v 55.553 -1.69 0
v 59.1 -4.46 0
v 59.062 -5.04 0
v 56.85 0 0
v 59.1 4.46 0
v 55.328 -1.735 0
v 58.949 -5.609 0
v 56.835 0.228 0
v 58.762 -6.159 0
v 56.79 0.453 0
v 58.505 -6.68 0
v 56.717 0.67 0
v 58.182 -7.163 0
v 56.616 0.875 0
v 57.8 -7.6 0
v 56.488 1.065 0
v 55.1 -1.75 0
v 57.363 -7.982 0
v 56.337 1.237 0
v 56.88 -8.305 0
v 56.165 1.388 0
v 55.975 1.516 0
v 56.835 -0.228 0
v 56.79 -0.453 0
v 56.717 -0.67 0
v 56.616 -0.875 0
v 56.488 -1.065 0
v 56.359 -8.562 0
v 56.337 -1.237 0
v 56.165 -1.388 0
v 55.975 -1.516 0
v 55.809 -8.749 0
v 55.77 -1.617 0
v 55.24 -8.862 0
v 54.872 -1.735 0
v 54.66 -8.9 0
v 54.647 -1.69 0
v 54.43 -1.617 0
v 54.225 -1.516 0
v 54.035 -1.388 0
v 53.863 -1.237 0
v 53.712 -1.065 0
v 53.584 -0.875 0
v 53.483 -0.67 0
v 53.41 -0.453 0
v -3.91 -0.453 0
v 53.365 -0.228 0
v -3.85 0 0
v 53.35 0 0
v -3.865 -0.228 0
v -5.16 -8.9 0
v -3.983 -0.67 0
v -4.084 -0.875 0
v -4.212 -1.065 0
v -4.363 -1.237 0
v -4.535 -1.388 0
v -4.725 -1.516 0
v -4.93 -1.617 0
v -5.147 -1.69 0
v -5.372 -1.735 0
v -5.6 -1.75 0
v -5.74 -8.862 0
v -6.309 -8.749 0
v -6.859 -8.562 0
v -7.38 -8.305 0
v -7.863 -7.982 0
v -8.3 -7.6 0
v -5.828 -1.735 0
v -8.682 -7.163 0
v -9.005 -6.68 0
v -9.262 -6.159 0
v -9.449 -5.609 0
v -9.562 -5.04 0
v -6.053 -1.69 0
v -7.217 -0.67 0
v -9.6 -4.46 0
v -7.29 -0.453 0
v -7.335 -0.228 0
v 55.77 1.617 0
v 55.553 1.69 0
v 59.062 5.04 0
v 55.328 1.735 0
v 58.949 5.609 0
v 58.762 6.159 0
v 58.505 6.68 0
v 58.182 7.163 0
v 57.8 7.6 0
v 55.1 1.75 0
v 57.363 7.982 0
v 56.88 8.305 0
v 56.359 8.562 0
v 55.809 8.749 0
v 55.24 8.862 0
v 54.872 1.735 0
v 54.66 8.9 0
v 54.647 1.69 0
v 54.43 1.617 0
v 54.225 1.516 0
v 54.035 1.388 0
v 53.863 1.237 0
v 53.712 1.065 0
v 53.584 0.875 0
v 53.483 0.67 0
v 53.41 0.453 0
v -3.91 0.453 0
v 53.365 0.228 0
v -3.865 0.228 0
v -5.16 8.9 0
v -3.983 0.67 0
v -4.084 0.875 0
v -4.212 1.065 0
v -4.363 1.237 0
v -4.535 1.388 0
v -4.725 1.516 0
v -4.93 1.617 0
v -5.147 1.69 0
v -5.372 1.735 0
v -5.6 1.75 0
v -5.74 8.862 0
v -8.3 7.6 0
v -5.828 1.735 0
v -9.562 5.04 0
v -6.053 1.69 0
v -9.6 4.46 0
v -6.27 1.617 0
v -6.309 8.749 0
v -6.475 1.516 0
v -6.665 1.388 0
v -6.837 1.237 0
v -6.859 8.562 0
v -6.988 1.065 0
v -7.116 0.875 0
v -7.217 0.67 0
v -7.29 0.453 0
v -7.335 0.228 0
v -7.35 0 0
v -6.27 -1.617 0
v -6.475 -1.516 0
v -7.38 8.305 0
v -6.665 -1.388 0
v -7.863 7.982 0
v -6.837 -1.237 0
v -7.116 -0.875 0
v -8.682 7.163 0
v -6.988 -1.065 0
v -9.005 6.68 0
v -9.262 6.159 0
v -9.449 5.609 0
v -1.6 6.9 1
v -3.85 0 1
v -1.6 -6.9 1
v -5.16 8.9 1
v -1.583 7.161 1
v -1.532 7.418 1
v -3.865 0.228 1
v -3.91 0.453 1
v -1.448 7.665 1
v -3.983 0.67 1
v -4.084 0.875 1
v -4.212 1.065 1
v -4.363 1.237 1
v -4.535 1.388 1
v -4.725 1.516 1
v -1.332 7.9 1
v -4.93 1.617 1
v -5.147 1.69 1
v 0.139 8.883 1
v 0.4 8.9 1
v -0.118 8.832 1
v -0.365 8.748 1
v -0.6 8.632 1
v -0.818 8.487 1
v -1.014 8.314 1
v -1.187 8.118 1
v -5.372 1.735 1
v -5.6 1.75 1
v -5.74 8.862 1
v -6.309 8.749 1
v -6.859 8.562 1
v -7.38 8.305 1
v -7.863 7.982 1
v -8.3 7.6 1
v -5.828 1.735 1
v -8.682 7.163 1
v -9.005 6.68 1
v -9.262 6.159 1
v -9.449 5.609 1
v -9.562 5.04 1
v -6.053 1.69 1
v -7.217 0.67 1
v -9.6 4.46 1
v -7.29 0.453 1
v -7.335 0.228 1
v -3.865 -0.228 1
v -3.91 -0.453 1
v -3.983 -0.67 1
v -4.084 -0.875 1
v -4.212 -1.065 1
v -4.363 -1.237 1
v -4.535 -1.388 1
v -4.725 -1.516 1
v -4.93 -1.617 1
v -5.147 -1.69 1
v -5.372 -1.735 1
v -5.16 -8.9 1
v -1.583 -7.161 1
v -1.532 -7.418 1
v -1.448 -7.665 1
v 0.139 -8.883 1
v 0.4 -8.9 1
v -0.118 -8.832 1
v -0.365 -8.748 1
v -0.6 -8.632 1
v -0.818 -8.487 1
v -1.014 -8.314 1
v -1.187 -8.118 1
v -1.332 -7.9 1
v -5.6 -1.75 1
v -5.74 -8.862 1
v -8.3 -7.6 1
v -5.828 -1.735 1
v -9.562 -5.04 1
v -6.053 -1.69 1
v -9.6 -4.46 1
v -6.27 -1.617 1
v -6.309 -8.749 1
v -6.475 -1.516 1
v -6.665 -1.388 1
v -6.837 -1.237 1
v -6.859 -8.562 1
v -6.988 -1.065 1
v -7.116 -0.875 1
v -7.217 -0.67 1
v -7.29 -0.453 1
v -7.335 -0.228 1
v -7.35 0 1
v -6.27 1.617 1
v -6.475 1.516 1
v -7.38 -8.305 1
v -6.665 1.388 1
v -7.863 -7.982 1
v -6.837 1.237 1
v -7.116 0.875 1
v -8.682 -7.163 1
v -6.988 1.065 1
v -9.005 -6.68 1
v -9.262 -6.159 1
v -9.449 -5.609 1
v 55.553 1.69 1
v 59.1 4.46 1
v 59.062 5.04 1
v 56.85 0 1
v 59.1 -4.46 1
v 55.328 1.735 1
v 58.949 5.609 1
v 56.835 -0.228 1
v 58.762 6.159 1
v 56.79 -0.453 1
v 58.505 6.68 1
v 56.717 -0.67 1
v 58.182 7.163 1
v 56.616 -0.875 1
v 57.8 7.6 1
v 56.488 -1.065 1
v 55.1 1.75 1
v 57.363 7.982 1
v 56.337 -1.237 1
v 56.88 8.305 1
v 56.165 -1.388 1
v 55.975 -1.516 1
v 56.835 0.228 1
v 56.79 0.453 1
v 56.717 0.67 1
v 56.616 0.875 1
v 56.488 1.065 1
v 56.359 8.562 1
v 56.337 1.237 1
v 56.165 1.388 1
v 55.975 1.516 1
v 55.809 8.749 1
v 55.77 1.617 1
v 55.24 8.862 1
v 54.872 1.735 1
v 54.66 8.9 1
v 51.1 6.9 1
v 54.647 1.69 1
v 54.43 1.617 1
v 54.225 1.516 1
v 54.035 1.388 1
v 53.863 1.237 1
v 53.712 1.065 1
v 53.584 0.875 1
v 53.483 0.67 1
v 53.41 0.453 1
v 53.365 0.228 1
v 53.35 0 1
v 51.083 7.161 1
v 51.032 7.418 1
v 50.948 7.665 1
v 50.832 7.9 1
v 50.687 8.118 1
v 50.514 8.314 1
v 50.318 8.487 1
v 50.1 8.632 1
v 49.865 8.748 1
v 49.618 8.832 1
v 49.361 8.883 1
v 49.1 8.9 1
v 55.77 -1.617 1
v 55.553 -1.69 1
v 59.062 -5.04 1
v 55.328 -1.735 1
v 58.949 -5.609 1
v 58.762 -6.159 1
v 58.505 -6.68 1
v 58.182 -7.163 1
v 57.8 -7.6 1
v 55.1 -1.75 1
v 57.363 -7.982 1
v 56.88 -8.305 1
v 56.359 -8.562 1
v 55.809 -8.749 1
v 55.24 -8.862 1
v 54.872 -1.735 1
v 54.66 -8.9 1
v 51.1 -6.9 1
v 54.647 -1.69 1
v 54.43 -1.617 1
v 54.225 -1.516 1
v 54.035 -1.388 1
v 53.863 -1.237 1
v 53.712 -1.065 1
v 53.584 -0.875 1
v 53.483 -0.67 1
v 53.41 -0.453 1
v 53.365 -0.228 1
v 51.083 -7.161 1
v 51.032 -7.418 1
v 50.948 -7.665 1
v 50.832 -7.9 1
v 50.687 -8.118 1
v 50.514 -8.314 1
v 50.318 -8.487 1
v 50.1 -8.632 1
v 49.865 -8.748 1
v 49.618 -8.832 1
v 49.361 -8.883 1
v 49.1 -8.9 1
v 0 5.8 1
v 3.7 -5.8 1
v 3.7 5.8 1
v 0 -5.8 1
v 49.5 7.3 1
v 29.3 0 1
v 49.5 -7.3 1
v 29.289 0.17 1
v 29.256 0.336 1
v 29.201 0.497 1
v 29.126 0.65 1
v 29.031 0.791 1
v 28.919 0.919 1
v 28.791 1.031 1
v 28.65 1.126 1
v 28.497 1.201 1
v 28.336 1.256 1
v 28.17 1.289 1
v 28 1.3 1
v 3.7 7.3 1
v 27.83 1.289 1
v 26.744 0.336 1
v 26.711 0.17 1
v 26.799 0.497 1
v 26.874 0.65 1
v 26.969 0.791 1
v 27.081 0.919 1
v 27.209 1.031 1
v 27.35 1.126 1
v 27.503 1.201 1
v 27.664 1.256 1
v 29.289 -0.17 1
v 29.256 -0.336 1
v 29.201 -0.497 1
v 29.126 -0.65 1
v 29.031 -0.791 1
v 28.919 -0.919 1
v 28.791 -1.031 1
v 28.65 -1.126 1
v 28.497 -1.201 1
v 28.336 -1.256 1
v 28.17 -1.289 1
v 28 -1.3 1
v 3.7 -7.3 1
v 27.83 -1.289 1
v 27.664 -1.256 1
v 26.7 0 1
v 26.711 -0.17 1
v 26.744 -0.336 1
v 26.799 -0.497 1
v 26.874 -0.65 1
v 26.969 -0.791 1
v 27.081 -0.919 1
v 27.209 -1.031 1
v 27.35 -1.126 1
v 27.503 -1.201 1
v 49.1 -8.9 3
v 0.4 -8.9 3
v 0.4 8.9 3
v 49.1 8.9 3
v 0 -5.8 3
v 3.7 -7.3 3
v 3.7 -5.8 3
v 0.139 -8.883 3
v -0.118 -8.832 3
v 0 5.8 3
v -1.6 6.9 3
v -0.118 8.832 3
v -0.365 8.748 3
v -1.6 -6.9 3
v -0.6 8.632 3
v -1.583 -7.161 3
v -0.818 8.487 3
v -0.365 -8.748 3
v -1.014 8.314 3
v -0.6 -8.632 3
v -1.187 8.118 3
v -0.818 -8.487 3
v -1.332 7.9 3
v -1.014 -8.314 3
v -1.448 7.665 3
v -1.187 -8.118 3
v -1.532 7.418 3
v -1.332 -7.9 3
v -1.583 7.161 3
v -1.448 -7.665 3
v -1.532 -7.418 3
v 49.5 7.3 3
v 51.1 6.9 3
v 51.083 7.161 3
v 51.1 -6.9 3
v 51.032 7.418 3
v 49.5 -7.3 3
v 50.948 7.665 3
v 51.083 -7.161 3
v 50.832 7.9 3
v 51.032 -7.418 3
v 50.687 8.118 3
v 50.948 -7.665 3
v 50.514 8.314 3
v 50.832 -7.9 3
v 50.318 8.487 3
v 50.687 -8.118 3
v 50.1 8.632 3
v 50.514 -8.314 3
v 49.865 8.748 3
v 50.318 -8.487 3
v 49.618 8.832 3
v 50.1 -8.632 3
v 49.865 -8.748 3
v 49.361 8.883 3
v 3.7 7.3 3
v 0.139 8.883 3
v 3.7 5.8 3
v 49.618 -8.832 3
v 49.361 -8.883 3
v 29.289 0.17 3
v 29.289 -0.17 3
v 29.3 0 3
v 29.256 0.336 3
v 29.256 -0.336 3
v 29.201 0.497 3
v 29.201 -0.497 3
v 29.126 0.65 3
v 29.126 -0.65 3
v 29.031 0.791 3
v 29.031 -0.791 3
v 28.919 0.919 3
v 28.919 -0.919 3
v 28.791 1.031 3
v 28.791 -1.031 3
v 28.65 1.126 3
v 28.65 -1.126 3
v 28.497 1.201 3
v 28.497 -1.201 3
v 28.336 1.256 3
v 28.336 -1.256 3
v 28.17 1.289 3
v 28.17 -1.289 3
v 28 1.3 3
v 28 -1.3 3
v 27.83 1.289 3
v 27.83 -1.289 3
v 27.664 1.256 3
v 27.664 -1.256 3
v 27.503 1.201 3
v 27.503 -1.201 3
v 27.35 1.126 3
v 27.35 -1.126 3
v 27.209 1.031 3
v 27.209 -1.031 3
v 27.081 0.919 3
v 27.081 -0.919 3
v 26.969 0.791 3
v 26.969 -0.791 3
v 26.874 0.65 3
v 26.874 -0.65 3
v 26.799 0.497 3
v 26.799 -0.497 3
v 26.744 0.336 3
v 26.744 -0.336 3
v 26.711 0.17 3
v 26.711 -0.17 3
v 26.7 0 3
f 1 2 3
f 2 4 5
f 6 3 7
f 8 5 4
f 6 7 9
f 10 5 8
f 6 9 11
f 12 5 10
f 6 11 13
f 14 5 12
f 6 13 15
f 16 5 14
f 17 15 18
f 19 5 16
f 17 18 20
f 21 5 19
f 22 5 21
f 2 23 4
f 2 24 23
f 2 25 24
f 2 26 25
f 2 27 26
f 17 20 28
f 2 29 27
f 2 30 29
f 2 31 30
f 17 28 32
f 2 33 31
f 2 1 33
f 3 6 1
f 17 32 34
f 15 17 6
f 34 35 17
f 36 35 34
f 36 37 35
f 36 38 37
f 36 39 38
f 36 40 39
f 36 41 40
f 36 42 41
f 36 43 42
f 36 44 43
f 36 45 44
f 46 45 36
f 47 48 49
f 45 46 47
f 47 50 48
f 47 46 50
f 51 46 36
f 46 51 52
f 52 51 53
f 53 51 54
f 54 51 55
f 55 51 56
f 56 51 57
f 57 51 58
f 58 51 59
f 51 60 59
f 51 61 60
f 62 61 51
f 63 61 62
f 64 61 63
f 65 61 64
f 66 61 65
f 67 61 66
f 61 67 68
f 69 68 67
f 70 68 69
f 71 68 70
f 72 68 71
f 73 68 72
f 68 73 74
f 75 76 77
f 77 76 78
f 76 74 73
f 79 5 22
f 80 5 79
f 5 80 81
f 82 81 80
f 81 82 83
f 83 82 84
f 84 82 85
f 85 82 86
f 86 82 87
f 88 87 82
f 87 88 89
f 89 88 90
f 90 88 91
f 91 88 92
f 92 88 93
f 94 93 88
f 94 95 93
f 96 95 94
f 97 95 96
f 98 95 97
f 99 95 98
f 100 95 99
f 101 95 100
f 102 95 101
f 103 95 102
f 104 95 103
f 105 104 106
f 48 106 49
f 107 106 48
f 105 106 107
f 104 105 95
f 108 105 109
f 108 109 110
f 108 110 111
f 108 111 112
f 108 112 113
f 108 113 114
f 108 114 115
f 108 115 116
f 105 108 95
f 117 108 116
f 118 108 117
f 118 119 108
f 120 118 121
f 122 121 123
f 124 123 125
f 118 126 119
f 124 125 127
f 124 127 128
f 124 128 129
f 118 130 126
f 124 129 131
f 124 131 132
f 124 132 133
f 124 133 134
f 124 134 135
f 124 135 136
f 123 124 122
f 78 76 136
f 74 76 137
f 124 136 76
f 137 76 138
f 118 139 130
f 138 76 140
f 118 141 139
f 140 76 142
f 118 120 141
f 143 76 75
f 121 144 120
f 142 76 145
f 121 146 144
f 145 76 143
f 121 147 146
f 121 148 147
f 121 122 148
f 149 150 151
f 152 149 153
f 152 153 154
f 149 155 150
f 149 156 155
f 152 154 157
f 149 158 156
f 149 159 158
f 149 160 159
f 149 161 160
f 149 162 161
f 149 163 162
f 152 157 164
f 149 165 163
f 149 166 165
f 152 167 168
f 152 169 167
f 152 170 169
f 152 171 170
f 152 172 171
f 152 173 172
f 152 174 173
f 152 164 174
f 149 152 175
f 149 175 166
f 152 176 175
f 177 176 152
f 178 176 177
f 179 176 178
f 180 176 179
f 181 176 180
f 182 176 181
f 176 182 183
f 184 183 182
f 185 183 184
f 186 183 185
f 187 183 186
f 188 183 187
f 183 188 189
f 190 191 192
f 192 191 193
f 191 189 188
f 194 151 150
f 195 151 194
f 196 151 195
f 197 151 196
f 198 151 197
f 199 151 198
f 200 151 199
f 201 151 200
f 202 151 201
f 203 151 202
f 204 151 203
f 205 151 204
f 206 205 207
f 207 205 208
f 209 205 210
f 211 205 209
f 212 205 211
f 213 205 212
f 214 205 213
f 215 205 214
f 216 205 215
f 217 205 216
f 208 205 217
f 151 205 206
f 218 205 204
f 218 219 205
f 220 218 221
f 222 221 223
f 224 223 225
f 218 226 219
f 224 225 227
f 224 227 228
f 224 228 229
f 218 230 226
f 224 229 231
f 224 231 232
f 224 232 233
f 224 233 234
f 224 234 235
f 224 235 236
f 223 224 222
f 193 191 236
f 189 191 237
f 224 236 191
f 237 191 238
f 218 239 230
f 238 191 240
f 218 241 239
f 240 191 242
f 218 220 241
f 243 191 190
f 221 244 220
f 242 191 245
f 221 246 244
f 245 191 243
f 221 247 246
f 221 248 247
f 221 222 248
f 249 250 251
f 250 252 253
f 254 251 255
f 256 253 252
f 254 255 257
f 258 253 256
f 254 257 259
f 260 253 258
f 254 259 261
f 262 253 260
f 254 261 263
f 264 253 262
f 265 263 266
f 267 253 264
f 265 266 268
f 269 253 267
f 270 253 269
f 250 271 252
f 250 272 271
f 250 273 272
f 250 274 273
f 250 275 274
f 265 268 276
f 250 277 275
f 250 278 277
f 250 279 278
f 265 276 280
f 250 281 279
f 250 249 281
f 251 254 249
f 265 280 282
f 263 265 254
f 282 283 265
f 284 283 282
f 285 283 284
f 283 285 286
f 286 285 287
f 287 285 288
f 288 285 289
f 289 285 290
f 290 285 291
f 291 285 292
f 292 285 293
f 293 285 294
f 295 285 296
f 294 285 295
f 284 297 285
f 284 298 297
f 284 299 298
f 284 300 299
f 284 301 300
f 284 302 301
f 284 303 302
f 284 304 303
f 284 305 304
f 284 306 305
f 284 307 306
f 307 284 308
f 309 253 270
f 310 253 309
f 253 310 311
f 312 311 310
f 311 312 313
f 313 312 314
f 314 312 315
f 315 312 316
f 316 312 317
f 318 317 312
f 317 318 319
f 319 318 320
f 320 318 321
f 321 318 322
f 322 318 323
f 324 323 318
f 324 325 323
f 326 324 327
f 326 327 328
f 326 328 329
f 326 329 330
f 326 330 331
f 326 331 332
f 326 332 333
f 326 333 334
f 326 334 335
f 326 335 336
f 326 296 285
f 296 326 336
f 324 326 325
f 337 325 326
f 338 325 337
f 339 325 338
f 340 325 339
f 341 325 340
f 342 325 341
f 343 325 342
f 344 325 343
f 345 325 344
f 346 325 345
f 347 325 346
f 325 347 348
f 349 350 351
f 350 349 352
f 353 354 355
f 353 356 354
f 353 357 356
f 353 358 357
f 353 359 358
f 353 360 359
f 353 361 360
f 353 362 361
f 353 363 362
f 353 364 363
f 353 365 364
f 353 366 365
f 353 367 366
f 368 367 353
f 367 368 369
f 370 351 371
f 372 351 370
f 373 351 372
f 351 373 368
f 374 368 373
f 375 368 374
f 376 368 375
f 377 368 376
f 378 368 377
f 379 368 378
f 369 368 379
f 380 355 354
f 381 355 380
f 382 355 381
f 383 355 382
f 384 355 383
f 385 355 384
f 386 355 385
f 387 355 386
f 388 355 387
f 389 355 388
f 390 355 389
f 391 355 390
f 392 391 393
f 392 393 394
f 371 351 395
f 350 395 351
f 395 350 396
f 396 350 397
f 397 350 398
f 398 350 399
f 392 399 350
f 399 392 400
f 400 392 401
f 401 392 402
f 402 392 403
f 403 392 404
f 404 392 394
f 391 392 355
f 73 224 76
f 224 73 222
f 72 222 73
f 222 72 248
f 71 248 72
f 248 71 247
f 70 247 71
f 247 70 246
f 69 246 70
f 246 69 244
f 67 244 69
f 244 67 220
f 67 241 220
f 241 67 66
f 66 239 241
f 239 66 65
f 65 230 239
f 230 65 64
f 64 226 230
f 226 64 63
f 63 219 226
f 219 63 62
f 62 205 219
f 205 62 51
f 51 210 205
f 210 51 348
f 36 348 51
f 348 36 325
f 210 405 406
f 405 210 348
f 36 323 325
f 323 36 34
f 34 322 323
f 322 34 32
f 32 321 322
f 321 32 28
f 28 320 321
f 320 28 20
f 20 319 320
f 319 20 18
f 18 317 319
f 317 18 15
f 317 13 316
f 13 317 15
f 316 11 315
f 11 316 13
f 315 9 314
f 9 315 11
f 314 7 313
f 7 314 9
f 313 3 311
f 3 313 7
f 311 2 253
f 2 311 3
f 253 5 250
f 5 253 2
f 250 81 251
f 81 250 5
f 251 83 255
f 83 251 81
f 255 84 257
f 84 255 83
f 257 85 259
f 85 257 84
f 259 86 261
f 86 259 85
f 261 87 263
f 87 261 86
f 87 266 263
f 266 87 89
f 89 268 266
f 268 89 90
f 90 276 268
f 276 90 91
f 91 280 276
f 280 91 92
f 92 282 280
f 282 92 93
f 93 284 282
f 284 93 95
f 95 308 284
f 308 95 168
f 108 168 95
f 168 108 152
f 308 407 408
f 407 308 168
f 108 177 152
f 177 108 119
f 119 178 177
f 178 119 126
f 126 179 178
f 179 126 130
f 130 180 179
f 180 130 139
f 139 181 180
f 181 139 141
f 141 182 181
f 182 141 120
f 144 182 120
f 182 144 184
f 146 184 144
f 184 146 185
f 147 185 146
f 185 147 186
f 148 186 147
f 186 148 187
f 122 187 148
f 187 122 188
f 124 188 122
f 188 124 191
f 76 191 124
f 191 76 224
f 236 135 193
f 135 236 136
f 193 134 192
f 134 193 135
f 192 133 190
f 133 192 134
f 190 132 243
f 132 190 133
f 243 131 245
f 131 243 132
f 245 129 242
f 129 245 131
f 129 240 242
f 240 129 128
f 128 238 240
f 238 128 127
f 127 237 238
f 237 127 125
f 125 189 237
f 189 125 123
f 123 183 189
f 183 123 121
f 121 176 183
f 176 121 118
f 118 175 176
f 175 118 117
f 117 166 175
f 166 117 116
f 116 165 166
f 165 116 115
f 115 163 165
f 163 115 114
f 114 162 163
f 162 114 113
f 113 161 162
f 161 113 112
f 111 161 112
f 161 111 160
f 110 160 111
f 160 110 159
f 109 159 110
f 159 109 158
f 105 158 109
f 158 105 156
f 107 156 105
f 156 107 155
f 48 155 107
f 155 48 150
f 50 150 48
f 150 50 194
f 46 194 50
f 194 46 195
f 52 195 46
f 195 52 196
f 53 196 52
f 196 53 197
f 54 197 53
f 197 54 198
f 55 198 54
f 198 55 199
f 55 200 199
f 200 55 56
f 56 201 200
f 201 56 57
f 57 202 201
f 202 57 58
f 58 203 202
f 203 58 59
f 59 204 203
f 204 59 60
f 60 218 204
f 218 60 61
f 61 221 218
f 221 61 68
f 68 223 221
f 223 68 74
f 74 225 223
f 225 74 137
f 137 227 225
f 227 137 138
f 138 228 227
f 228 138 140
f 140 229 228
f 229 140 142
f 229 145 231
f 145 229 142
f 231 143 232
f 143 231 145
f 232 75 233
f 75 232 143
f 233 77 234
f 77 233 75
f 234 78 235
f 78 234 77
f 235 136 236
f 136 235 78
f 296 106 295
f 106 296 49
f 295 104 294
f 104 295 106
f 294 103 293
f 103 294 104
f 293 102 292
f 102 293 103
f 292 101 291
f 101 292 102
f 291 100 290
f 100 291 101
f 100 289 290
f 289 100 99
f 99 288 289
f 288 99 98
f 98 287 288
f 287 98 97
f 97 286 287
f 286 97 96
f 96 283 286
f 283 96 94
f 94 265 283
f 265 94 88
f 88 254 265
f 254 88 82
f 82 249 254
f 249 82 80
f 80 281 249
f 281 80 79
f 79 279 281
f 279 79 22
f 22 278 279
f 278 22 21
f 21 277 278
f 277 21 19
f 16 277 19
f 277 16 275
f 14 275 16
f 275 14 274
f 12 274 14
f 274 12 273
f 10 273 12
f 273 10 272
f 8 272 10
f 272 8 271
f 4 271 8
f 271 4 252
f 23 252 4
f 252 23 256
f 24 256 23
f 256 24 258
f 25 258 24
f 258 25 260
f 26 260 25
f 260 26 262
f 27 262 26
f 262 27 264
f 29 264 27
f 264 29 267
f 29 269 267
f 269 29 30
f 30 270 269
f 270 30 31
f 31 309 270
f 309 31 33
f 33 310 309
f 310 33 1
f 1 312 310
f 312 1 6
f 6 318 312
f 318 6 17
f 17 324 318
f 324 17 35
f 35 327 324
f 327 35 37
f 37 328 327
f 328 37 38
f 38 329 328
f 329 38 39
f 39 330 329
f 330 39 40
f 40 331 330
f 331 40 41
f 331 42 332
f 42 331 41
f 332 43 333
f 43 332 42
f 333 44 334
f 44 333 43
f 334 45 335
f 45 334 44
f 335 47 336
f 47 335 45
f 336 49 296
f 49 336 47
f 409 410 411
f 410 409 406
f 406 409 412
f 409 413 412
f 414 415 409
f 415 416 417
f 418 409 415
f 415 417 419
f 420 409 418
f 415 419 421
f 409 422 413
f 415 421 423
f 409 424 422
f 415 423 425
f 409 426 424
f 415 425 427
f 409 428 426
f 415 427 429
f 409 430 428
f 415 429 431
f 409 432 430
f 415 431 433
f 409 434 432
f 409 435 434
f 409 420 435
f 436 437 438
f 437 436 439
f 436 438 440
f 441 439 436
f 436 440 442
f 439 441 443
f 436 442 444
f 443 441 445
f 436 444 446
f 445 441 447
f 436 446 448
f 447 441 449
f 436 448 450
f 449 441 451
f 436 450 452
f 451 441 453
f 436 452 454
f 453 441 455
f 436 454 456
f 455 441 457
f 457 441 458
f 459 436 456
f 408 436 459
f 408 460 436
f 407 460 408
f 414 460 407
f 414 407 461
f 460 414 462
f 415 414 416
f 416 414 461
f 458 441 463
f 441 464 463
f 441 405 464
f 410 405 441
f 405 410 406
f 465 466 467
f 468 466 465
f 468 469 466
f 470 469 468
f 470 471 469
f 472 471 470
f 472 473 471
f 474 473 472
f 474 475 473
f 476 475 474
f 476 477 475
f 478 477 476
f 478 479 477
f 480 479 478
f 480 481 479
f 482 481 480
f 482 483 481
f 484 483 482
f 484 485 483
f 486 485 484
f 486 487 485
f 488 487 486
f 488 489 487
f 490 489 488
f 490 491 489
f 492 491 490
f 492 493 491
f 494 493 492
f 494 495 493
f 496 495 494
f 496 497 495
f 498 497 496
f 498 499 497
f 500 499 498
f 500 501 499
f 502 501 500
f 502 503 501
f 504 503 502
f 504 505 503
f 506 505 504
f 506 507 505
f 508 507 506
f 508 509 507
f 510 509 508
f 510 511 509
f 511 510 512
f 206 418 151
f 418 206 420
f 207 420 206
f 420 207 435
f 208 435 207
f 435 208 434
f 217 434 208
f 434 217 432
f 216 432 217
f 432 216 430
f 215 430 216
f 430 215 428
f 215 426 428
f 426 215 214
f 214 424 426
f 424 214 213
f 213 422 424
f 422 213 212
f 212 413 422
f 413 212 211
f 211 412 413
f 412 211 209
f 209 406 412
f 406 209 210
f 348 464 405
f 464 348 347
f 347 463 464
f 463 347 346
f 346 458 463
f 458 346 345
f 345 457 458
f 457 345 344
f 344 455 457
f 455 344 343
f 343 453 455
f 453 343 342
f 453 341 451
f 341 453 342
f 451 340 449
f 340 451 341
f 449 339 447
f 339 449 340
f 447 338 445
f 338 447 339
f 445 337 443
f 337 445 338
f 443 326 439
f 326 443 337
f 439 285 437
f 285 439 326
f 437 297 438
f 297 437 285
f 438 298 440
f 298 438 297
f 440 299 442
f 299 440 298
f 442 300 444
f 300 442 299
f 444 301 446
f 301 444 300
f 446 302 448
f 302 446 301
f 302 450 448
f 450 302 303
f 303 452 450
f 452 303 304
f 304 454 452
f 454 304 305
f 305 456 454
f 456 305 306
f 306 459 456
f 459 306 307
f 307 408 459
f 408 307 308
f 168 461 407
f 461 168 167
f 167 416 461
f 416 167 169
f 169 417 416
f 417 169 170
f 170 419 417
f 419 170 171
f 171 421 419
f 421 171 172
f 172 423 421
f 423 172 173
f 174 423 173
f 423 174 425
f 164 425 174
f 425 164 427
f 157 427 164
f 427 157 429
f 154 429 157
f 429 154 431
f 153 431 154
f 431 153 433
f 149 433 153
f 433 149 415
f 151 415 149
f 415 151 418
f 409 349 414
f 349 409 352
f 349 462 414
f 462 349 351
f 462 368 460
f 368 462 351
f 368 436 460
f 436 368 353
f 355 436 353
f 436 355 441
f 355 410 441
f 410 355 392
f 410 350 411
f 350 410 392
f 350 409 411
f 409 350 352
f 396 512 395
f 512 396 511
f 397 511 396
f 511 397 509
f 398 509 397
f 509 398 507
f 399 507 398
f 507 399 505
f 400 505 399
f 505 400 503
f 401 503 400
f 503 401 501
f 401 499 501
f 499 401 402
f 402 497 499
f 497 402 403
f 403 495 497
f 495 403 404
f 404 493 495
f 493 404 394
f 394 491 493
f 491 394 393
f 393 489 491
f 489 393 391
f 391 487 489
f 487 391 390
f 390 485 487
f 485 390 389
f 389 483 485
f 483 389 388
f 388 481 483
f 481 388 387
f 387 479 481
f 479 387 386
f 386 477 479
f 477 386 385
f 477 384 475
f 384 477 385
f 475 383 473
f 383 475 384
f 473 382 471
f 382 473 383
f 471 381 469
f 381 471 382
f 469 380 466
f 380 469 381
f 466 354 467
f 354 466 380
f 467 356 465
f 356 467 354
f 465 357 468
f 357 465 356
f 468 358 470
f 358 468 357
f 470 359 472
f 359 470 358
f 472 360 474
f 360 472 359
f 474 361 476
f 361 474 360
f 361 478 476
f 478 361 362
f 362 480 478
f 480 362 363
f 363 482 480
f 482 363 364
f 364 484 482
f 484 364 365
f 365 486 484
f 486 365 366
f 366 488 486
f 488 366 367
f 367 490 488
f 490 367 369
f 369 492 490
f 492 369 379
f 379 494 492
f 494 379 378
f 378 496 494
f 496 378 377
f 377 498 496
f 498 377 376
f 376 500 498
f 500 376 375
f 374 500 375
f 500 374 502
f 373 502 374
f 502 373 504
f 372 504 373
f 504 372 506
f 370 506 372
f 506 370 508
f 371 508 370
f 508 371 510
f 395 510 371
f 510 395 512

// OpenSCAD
// Fit-check gauge, generated: shop gauge projects/photocell-flame-pod "shell()" 1 4.5
// Two horizontal slices of the finished part, re-extruded thin. Rerun the command to change it;
// a hand-written gauge replaces this file and drops this first line.
// parts: photocell-flame-pod-gauge
use <model.scad>

/* [Gauge] */
z_plate = 1;   // slice height through the plate: its outline and through-holes
z_wall = 4.5;    // slice height through the walls the object sits against; below 0 for none
gauge_t = 1;       // gauge plate thickness
gauge_rise = 2;    // gauge wall height above the plate

module gauge_slice() {
    linear_extrude(gauge_t) projection(cut = true) translate([0, 0, -z_plate]) children();
    if (z_wall >= 0) translate([0, 0, gauge_t - 0.01]) linear_extrude(gauge_rise + 0.01) projection(cut = true) translate([0, 0, -z_wall]) children();
}

gauge_slice() shell();
